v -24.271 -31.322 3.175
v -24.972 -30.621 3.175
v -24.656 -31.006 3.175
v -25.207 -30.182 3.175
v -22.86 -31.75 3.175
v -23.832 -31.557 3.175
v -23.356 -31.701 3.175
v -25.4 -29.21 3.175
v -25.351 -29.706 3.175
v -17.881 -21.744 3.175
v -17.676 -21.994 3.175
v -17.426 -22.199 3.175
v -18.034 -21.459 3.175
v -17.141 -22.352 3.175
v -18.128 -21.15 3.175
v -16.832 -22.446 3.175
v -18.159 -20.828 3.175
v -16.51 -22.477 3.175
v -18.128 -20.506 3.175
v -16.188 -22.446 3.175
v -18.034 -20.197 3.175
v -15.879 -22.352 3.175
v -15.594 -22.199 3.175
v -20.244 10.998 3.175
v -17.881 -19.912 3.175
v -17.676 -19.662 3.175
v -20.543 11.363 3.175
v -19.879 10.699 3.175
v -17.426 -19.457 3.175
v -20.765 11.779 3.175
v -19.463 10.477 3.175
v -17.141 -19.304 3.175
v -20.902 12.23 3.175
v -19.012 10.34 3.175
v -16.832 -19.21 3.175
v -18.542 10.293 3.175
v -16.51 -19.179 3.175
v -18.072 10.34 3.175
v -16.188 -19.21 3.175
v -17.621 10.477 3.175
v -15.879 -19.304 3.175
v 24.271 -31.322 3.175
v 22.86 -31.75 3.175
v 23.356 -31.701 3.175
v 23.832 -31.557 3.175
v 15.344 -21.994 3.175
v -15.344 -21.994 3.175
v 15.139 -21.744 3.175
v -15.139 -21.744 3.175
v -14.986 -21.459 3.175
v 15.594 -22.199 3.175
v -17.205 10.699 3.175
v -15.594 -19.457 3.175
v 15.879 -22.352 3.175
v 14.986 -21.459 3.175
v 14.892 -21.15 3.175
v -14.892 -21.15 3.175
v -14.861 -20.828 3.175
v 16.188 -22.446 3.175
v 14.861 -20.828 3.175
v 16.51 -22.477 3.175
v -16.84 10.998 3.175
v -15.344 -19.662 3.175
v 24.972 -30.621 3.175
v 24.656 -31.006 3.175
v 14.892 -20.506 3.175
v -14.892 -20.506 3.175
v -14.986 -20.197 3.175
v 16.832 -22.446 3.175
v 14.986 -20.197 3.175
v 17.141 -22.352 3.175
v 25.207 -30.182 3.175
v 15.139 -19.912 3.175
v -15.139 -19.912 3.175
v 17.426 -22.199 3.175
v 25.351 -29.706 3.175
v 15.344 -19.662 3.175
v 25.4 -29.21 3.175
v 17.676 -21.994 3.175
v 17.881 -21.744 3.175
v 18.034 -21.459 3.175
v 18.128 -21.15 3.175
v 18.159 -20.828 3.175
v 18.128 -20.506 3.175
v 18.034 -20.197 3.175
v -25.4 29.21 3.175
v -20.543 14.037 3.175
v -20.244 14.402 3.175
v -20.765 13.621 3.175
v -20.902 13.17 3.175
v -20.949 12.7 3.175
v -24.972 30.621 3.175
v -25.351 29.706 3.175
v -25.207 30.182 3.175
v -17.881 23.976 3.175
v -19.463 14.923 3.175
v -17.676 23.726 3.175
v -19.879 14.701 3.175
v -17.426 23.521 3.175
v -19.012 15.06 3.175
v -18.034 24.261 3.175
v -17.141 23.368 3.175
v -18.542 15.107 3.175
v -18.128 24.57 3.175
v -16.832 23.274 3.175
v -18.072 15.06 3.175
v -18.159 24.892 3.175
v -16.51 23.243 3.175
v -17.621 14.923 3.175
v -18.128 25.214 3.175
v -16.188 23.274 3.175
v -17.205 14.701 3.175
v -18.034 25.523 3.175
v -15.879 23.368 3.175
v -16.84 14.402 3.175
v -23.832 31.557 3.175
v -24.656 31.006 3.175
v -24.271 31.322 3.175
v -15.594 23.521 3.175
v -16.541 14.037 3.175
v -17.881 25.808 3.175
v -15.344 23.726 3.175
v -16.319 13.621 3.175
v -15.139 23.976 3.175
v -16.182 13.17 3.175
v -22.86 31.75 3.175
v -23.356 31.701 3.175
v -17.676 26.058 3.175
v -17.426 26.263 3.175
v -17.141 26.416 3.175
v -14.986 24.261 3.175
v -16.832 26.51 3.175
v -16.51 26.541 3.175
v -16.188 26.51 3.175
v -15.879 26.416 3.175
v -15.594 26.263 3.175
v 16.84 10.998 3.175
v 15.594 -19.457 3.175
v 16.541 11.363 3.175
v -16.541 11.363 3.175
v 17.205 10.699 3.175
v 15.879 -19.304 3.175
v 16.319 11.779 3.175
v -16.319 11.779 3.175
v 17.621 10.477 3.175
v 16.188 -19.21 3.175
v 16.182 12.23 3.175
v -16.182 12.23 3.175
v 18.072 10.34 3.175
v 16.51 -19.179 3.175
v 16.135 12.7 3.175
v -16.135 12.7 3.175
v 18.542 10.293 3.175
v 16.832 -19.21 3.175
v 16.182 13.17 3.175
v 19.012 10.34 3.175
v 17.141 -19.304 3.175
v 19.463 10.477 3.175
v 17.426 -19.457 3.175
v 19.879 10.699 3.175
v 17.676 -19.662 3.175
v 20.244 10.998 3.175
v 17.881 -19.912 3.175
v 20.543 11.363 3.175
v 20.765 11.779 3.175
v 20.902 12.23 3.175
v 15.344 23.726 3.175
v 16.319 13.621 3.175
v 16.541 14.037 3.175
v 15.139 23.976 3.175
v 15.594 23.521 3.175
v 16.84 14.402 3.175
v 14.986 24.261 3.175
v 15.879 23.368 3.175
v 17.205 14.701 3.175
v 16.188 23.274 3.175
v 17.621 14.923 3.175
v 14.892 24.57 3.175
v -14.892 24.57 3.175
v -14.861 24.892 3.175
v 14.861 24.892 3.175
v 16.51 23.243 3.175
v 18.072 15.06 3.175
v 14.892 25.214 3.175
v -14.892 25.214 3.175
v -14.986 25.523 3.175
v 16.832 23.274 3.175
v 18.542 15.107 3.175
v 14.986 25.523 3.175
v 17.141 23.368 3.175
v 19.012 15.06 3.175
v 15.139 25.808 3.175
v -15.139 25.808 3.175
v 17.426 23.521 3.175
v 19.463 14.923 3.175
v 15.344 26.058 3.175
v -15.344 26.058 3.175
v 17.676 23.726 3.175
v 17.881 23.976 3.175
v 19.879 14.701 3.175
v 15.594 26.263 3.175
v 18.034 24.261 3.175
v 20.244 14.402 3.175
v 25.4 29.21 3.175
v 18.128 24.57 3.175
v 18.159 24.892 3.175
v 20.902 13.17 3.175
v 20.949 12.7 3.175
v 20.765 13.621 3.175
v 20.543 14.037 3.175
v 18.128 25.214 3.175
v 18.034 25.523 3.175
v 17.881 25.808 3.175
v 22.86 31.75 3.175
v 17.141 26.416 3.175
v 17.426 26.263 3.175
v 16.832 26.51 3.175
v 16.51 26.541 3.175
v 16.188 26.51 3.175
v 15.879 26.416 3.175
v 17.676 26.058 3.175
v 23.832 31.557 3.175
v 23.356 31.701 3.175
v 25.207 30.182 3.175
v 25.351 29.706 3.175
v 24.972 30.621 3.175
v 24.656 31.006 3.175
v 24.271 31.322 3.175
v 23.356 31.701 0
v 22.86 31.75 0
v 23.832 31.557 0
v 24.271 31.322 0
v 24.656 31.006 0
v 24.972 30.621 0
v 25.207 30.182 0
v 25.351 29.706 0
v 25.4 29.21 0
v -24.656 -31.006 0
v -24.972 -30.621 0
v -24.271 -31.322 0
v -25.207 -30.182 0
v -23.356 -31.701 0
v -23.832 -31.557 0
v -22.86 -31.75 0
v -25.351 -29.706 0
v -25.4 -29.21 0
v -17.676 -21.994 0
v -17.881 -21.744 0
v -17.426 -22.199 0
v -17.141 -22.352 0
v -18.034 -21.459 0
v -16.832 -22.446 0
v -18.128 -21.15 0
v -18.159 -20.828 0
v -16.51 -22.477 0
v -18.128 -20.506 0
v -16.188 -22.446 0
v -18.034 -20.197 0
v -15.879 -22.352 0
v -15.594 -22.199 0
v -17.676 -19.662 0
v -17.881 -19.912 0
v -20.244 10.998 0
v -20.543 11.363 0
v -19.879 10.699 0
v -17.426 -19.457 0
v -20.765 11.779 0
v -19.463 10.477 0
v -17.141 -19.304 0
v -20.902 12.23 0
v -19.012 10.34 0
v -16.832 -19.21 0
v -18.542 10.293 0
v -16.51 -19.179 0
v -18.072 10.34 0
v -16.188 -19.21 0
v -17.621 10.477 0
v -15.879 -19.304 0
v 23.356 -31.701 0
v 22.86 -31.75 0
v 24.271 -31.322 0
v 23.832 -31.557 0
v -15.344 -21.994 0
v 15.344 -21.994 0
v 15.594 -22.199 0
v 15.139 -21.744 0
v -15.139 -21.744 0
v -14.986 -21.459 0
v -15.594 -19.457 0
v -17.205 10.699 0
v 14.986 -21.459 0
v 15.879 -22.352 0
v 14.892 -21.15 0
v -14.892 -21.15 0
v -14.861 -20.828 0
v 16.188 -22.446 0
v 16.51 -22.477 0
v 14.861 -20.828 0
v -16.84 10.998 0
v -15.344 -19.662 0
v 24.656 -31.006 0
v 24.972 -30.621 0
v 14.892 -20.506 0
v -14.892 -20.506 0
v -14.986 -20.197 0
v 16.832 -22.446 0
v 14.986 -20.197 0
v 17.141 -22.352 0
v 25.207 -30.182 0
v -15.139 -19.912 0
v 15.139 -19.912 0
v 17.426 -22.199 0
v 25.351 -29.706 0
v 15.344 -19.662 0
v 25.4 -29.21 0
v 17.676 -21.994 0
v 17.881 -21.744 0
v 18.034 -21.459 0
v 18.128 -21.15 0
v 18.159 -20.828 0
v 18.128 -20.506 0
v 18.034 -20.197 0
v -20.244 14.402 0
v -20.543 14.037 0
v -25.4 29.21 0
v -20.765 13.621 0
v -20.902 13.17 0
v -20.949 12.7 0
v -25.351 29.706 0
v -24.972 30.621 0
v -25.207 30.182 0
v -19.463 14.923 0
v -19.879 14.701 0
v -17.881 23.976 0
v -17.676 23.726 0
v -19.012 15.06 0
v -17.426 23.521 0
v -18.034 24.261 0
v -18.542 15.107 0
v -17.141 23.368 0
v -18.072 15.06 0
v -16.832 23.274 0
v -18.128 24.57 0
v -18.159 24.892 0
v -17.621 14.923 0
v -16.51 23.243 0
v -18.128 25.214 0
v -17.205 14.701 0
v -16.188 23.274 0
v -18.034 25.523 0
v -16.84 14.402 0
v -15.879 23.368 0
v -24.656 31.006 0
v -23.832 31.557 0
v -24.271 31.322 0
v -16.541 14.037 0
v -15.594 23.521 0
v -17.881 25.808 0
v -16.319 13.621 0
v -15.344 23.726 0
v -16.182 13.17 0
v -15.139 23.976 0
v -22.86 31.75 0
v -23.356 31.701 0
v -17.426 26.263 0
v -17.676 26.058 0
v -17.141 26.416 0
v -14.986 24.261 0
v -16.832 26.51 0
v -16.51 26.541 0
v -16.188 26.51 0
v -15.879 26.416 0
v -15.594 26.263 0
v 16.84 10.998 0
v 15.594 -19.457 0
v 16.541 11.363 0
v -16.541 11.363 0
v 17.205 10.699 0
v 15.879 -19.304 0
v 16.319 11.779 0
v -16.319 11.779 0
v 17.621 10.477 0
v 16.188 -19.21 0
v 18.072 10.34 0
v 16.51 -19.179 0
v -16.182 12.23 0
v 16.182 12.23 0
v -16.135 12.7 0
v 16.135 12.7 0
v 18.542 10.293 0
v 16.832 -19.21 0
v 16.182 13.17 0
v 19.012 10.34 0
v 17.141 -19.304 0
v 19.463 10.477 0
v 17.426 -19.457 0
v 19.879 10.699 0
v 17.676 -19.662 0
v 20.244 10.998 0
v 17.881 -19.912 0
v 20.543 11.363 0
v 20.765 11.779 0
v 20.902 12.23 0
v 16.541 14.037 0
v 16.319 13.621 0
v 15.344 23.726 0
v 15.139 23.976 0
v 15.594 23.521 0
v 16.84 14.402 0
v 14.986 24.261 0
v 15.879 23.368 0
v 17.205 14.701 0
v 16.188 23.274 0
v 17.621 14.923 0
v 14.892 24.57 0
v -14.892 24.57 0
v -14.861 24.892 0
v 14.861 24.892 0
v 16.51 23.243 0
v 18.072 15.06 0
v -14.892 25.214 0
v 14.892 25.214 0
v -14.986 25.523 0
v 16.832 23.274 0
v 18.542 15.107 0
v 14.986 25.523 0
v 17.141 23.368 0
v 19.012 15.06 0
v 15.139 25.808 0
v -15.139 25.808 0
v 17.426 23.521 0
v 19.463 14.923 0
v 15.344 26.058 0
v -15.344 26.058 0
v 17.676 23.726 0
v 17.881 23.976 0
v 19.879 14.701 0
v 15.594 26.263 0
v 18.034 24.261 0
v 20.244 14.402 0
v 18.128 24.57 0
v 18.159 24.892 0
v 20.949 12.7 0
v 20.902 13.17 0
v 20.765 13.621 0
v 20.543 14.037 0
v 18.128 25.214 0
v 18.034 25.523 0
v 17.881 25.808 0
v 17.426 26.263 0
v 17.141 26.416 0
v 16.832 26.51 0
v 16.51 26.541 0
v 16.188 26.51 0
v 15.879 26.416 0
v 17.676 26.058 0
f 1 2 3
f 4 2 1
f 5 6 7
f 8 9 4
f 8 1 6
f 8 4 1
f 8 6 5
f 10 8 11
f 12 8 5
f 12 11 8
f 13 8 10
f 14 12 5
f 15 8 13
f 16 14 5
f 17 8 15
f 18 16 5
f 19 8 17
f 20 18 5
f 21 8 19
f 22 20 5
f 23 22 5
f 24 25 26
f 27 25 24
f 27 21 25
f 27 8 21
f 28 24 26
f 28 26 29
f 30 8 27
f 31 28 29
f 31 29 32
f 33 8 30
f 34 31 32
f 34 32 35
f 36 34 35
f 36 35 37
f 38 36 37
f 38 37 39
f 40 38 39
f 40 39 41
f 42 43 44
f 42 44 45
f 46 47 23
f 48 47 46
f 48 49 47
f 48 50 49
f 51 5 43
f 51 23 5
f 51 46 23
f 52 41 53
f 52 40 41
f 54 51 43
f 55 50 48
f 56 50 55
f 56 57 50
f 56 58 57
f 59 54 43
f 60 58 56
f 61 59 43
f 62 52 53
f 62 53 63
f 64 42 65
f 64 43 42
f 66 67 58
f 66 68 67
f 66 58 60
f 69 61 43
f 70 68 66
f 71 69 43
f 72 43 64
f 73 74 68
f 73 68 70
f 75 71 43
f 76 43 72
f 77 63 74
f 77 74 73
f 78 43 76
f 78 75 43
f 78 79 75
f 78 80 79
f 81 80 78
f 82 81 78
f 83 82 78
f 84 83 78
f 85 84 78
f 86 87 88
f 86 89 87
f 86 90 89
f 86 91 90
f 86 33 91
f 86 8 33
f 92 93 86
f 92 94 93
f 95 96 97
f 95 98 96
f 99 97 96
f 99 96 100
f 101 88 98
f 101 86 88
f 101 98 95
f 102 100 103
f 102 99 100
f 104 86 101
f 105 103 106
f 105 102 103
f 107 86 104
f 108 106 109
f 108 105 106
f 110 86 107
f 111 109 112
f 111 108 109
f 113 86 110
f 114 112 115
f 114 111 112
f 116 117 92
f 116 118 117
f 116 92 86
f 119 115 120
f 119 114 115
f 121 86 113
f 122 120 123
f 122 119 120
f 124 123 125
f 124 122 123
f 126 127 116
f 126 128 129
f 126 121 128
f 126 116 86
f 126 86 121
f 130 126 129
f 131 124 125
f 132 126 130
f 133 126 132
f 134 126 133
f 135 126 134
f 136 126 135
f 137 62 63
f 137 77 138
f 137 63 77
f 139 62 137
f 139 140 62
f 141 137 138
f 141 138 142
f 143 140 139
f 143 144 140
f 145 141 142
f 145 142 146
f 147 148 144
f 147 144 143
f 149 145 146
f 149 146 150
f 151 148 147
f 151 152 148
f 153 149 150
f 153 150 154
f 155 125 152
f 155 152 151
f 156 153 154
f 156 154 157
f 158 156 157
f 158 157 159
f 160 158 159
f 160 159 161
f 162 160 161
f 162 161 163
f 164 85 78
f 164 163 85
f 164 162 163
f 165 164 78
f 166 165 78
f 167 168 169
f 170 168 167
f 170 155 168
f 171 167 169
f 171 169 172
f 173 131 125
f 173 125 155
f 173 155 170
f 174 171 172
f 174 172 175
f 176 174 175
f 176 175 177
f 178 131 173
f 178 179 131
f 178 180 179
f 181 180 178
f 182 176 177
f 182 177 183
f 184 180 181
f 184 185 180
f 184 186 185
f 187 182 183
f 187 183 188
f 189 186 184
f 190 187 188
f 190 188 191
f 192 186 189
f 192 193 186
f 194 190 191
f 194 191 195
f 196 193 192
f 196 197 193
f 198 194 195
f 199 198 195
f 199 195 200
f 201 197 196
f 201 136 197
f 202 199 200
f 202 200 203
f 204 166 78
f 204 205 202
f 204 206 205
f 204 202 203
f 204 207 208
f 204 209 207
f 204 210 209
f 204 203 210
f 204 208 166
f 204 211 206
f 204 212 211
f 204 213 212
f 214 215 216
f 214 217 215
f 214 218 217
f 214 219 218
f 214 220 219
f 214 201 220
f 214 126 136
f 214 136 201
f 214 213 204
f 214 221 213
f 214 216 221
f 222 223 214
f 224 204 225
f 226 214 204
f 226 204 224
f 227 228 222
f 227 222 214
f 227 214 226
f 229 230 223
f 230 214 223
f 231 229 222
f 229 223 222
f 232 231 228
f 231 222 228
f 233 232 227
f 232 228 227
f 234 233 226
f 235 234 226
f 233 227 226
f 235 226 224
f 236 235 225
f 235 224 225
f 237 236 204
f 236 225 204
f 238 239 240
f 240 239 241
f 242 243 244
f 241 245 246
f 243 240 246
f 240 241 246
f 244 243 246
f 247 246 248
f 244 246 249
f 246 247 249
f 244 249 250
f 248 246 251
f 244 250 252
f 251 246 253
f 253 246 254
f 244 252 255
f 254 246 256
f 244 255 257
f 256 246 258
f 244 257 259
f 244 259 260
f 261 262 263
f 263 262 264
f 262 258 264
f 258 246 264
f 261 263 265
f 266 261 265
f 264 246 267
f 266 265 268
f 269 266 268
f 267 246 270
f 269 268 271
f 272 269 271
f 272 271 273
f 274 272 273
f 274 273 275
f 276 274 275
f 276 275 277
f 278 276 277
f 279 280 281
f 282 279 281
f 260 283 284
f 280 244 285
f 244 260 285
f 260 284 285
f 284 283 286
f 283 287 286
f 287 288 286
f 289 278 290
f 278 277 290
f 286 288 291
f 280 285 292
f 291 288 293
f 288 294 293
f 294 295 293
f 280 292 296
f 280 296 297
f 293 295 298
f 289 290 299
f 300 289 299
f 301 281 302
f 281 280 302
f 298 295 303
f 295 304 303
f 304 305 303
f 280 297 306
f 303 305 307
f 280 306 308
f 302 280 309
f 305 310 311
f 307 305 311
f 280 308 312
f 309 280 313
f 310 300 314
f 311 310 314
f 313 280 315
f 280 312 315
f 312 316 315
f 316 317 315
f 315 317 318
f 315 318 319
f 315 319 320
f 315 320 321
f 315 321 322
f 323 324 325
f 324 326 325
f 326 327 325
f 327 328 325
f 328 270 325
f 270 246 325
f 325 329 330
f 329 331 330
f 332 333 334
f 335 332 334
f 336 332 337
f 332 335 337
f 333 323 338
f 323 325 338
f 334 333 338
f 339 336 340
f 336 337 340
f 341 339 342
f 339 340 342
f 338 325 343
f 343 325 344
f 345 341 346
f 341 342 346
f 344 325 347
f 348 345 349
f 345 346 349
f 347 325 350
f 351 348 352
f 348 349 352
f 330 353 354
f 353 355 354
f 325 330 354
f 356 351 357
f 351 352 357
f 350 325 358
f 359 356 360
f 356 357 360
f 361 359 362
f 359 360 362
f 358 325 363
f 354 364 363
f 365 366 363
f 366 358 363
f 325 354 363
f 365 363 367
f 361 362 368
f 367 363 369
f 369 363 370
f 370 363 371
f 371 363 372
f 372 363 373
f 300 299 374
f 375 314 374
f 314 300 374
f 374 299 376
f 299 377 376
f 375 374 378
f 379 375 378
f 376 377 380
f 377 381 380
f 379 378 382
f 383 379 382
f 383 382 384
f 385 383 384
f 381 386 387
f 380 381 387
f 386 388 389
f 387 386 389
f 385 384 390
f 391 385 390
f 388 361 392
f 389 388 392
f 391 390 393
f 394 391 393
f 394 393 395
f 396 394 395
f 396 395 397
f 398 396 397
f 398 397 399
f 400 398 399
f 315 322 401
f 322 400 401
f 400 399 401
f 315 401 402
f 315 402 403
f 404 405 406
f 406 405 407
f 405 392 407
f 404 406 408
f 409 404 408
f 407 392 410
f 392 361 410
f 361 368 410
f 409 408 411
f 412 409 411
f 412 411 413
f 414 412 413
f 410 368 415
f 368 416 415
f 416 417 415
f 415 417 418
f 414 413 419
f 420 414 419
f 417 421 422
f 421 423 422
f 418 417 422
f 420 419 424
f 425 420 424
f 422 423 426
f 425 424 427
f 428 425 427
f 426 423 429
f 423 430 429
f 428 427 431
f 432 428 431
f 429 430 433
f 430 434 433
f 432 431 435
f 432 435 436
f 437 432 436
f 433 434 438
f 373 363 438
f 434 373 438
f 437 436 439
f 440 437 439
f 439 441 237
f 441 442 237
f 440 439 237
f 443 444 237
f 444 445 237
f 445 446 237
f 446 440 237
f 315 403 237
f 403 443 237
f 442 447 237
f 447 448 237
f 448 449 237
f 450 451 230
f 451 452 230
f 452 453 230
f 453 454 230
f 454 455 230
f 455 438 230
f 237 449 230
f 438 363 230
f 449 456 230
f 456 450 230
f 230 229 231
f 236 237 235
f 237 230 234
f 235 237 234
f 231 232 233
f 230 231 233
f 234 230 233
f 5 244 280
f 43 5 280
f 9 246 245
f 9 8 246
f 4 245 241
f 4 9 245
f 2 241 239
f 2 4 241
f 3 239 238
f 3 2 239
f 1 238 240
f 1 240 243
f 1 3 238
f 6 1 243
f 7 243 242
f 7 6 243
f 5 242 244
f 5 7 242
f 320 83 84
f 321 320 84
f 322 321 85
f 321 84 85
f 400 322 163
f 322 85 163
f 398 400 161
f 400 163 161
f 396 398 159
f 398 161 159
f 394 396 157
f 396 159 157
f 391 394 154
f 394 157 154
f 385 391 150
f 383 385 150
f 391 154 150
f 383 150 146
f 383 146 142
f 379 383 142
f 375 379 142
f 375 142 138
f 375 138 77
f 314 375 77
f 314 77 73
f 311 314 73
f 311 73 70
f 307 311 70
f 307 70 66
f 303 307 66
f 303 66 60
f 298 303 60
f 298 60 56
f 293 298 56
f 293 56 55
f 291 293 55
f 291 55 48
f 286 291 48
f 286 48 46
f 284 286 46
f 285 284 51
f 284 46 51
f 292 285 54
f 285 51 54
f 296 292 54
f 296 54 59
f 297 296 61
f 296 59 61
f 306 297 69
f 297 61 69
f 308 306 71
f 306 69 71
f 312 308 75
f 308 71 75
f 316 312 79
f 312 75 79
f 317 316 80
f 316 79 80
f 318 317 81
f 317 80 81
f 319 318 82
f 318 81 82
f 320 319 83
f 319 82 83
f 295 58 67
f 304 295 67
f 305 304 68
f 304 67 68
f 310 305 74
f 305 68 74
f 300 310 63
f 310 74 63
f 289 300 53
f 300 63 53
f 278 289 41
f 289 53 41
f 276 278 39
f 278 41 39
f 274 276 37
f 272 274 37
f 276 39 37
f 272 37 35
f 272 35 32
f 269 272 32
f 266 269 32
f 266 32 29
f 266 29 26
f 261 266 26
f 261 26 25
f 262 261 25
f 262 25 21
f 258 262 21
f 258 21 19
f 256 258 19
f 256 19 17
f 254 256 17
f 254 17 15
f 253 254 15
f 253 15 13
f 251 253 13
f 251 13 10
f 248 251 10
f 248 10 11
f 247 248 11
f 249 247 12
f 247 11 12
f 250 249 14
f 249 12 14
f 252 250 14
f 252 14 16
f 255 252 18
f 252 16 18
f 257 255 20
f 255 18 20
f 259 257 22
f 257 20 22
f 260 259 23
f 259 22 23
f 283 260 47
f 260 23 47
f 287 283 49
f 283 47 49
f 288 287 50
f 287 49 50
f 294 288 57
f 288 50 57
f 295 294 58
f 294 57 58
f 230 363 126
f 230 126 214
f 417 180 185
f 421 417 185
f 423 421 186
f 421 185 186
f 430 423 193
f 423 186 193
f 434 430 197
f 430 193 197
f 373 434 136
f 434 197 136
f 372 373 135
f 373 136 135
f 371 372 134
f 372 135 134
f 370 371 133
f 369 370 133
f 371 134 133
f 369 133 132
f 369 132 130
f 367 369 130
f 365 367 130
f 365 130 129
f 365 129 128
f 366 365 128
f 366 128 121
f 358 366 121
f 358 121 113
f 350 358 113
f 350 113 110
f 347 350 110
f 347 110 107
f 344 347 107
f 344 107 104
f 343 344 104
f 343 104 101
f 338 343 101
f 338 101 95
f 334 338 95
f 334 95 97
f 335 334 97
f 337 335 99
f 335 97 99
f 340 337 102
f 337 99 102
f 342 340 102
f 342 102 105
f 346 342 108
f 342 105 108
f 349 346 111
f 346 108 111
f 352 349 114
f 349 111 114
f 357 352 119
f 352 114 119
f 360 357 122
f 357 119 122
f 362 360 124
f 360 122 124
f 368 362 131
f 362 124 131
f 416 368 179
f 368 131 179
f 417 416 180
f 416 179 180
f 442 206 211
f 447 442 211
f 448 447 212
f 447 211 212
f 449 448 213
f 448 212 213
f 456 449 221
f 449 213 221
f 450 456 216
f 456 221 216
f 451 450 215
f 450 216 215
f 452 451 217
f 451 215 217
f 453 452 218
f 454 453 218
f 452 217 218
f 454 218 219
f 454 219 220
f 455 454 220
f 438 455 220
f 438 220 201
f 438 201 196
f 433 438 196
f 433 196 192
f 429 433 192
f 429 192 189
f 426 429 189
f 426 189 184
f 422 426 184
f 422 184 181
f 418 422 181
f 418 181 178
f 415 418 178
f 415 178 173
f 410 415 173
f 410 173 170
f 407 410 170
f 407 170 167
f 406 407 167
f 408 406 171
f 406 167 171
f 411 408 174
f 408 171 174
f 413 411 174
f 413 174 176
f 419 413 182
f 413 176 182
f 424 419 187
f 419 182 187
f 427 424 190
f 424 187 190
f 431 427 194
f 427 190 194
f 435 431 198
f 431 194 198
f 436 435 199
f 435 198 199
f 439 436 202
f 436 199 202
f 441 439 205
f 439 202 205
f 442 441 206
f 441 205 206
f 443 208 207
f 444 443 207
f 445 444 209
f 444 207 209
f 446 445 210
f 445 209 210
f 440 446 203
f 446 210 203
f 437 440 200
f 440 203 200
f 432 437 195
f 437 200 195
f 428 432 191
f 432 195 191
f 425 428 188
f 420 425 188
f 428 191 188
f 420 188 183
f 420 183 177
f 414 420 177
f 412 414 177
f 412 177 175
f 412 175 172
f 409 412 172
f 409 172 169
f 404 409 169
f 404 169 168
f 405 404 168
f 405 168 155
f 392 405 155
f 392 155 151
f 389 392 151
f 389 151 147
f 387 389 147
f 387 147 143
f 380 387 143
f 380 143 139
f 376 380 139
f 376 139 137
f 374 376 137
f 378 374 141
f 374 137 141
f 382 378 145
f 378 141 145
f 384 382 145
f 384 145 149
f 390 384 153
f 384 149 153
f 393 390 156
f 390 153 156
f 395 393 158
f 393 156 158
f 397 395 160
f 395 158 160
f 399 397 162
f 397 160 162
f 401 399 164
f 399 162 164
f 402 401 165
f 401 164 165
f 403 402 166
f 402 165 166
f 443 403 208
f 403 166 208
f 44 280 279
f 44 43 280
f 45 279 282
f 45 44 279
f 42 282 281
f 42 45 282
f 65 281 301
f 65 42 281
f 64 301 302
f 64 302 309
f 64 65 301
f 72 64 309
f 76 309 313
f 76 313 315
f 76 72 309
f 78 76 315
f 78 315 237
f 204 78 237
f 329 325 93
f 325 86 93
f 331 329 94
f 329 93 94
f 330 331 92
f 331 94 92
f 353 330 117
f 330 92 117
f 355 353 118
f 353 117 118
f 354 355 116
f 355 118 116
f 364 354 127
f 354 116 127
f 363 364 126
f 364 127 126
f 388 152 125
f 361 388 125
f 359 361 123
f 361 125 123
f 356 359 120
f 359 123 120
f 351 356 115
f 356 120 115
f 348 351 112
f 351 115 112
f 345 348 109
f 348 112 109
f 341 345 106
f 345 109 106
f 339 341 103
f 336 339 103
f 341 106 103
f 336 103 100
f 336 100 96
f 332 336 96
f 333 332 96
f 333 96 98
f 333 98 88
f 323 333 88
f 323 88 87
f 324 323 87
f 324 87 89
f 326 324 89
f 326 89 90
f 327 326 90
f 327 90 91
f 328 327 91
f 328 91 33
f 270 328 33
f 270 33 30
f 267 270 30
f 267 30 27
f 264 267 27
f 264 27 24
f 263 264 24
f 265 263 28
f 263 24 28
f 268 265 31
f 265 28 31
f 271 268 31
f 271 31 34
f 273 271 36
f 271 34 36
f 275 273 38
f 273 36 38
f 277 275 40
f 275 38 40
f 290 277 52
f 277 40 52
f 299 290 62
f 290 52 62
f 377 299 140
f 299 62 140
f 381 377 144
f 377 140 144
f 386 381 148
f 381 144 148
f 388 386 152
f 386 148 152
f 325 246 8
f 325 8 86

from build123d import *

# Parameters (mm, degrees)
SKETCH1_W                        = 50.8
SKETCH1_H                        = 63.5
BOSS_EXTRUDE1_DEPTH              = 3.175
F_10_0_1935_DIAMETER_HOLE1_D     = 4.8133
F_10_0_1935_DIAMETER_HOLE1_DEPTH = 3.175
M3_CLEARANCE_HOLE1_D             = 3.2984
M3_CLEARANCE_HOLE1_DEPTH         = 3.175
FILLET1_R                        = 2.54


with BuildPart() as part:
    # Sketch1 → Boss-Extrude1 (new body)
    with BuildSketch(Plane.XY):
        Rectangle(SKETCH1_W, SKETCH1_H)
    extrude(amount=BOSS_EXTRUDE1_DEPTH)

    # #10 (0.1935) Diameter Hole1
    with Locations(Plane(origin=(0, 0, 0), x_dir=(-1, 0, 0), z_dir=(0, 0, -1))):
        with Locations((-18.542, 12.7), (18.542, 12.7)):
            Hole(F_10_0_1935_DIAMETER_HOLE1_D / 2, depth=F_10_0_1935_DIAMETER_HOLE1_DEPTH)

    # M3 Clearance Hole1
    with Locations(Plane(origin=(0, 0, 0), x_dir=(-1, 0, 0), z_dir=(0, 0, -1))):
        with Locations((-16.51, 24.892), (16.51, 24.892), (-16.51, -20.828), (16.51, -20.828)):
            Hole(M3_CLEARANCE_HOLE1_D / 2, depth=M3_CLEARANCE_HOLE1_DEPTH)

    # Fillet1
    fillet1_edges = [part.edges().sort_by_distance(p)[0] for p in [
        (25.4, -31.75, 1.5875),
        (-25.4, -31.75, 1.5875),
        (-25.4, 31.75, 1.5875),
        (25.4, 31.75, 1.5875),
    ]]
    fillet(fillet1_edges, radius=FILLET1_R)


solid = part.part
